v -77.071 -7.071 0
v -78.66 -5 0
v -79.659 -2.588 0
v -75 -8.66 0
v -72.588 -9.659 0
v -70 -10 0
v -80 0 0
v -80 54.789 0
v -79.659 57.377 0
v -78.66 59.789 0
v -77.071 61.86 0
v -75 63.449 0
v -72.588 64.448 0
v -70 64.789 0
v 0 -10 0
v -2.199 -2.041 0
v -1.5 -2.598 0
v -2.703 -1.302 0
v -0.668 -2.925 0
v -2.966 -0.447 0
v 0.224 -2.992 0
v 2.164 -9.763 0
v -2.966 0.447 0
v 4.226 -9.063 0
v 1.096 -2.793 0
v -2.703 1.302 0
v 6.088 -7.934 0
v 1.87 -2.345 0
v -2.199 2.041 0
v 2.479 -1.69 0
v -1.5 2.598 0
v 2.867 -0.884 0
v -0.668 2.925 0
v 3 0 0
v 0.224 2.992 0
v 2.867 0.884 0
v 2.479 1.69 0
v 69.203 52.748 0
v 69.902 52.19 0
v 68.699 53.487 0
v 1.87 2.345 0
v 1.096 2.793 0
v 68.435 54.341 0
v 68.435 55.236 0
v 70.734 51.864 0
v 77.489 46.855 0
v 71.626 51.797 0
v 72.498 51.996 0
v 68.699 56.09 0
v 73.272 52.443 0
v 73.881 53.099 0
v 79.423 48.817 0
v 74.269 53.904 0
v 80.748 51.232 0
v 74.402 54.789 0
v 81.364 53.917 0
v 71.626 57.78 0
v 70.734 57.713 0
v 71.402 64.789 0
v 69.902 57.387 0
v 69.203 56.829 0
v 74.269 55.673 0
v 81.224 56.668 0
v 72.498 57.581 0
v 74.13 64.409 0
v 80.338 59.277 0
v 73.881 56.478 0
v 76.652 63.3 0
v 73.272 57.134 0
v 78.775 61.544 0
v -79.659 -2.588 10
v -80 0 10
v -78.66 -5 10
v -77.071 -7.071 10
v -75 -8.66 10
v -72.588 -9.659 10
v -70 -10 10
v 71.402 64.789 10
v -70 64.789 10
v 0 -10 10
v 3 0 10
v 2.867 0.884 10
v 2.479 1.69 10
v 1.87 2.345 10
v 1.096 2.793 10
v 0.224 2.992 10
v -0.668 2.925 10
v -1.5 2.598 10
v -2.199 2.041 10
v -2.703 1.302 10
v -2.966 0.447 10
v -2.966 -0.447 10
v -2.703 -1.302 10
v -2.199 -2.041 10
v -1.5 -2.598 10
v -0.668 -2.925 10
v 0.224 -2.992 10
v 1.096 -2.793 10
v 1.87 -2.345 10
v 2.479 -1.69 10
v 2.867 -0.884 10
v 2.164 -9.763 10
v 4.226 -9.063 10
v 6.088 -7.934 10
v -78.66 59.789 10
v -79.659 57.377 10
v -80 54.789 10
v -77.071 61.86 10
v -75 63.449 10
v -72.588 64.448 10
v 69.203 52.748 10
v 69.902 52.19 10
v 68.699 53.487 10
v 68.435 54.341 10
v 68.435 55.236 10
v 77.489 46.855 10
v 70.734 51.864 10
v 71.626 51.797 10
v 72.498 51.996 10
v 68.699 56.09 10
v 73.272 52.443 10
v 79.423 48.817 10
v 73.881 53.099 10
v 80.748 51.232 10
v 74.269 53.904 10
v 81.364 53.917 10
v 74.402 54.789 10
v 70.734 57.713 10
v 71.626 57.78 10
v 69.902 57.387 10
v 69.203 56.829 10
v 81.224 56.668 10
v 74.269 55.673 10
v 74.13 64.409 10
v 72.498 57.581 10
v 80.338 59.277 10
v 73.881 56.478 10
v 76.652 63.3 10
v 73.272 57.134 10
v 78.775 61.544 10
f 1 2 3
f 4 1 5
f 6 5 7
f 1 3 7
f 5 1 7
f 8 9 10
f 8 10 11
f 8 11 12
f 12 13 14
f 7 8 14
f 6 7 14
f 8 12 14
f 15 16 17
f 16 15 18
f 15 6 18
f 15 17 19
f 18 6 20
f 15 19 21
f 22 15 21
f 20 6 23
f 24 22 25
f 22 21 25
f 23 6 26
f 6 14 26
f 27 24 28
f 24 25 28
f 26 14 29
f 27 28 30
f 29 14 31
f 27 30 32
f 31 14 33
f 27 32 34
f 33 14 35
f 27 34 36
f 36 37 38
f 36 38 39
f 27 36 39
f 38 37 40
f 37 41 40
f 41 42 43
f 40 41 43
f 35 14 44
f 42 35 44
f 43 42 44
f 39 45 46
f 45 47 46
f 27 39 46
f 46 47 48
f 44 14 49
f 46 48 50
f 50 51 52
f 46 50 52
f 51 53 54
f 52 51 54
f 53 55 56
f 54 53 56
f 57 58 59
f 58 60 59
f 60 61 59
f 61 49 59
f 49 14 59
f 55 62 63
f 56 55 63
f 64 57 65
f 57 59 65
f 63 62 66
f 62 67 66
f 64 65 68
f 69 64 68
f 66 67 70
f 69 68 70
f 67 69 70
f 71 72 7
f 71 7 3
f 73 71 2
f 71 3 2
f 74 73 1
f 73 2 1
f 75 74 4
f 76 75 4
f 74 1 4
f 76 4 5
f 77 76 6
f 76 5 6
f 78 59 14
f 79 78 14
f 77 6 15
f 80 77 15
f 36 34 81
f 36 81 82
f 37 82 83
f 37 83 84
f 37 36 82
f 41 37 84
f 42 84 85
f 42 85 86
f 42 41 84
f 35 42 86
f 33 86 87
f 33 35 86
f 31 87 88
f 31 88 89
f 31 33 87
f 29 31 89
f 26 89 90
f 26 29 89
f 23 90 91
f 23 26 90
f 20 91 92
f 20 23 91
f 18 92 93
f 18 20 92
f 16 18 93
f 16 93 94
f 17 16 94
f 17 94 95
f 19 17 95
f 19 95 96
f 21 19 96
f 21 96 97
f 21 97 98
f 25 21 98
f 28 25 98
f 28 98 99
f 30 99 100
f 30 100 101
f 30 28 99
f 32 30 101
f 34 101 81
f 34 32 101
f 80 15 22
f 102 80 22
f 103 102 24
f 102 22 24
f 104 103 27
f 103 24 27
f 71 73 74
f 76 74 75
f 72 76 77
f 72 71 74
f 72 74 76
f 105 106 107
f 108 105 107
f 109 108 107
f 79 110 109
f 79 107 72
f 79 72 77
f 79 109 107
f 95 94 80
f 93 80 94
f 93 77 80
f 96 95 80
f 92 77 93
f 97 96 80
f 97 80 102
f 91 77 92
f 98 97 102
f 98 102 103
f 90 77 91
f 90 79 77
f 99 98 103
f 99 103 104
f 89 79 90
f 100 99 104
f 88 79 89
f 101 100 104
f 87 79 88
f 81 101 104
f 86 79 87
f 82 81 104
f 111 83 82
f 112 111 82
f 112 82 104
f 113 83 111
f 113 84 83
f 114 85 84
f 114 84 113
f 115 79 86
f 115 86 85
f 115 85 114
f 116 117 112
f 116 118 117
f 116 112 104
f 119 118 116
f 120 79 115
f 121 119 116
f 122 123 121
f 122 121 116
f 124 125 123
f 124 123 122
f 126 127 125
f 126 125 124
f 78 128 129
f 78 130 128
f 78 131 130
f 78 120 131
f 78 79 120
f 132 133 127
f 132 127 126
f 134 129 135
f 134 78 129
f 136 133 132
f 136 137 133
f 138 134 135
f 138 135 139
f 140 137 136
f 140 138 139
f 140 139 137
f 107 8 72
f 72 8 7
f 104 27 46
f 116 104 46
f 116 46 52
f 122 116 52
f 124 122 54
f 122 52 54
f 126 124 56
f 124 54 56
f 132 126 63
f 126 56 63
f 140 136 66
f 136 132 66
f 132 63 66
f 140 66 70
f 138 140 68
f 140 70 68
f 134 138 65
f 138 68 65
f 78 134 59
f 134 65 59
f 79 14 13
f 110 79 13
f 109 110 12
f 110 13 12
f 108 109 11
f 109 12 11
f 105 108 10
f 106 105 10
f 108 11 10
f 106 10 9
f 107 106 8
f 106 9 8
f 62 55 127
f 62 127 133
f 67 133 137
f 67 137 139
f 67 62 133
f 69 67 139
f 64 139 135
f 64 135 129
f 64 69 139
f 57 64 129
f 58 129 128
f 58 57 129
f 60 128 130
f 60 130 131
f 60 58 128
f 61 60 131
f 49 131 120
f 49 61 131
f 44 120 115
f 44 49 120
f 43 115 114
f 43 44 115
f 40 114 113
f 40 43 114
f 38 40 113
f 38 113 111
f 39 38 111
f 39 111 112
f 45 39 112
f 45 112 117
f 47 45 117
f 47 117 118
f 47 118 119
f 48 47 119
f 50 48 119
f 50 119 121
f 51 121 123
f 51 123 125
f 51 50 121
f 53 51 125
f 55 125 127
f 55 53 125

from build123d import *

# Parameters (mm, degrees)
SKETCH2_R      = 10
SKETCH2_R_2    = 3
EXTRUDE1_DEPTH = 10


with BuildPart() as part:
    # Sketch2 → Extrude1 (new body)
    # profile 1 of 5: a face of its own
    with BuildSketch(Plane.XY):
        with BuildLine():
            Line((71.401800626, 64.788528611), (-70, 64.788528611))
            ThreePointArc((-70, 64.788528611), (-62.928932188, 61.859596423), (-60, 54.788528611))
            ThreePointArc((-60, 54.788528611), (-70, 44.788528611), (-80, 54.788528611))
            Line((-80, 54.788528611), (-80, 0))
            ThreePointArc((-80, 0), (-70, 10), (-60, 0))
            ThreePointArc((-60, 0), (-62.928932188, -7.071067812), (-70, -10))
            Line((-70, -10), (0, -10))
            ThreePointArc((0, -10), (-7.071067812, 7.071067812), (10, 0))
            ThreePointArc((10, 0), (8.968727415, -4.422886902), (6.08761429, -7.933533403))
            Line((6.08761429, -7.933533403), (77.489414916, 46.854995208))
            ThreePointArc((77.489414916, 46.854995208), (61.932499331, 51.574133958), (71.401800626, 64.788528611))
        make_face()
    # profile 2 of 5: a face of its own
    with BuildSketch(Plane.XY):
        Circle(SKETCH2_R)
        Circle(SKETCH2_R_2, mode=Mode.SUBTRACT)
    # profile 3 of 5: a face of its own
    with BuildSketch(Plane.XY):
        with Locations((-70, 0)):
            Circle(SKETCH2_R)
    # profile 4 of 5: a face of its own
    with BuildSketch(Plane.XY):
        with Locations((-70, 54.788528611)):
            Circle(SKETCH2_R)
    # profile 5 of 5: a face of its own
    with BuildSketch(Plane.XY):
        with Locations((71.401800626, 54.788528611)):
            Circle(SKETCH2_R)
        with Locations((71.401800626, 54.788528611)):
            Circle(SKETCH2_R_2, mode=Mode.SUBTRACT)
    extrude(amount=EXTRUDE1_DEPTH)


solid = part.part
